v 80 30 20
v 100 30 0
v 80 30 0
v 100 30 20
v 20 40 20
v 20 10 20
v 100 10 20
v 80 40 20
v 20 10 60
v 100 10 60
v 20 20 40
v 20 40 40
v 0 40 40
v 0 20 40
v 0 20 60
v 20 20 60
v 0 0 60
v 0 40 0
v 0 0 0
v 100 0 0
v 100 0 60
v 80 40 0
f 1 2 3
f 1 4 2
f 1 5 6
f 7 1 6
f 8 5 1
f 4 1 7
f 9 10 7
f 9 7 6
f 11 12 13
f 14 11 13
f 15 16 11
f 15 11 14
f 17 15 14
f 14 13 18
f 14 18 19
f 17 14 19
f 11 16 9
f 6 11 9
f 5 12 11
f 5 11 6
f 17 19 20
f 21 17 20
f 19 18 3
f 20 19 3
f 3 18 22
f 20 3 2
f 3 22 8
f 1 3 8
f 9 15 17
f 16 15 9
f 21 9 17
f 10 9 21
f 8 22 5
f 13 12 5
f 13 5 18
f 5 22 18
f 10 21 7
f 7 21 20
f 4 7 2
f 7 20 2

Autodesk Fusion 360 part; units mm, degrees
sketch "Sketch1" plane through (0, 0, 0) normal (0, 0, 1) x (1, 0, 0)
  line L0 (4, 0) -> (0, 0)
  line L1 (0, 0) -> (0, 2.25)
  line L2 (0, 2.25) -> (1.5, 2.25)
  line L3 (1.5, 2.25) -> (1.5, 1.5)
  line L4 (1.5, 1.5) -> (2.75, 1.5)
  line L5 (2.75, 1.5) -> (2.75, 0.75)
  line L6 (2.75, 0.75) -> (4, 0.75)
  line L7 (4, 0.75) -> (4, 0)
  dimension "d1" = 4
  dimension "d4" = 2.25
  dimension "d5" = 1.25
  dimension "d6" = 1.5
  dimension "d7" = 0.75
  dimension "d8" = 0.75
  dimension "d10" = 1.25
sketch "Sketch2" plane through (0, 2.25, 0) normal (0, 1, 0) x (-1, 0, 0)
  line L0 (-1.5, 0) -> (0, 0)
  line L1 (0, 0) -> (0, 1.25)
  line L2 (0, 1.25) -> (-1.5, 1.25)
  line L3 (-1.5, 1.25) -> (-1.5, 0)
  line L4 (-1.5, 0.2963) -> (-0.6318, 0.2963)
  line L5 (-0.6318, 0.2963) -> (-0.6318, 0.976)
  line L6 (-0.6318, 0.976) -> (-3.3284, 0.976)
  line L7 (-3.3284, 0.976) -> (-3.3284, 0.2963)
  line L8 (-3.3284, 0.2963) -> (-1.5, 0.2963)
sketch "Sketch3" plane through (0, 0, 0) normal (0, 0, 1) x (1, 0, 0)
  line L0 (0, 0) -> (100, 0)
  line L1 (100, 0) -> (100, 40)
  line L2 (100, 40) -> (0, 40)
  line L3 (0, 40) -> (0, 0)
  dimension "d15" = 100
  dimension "d16" = 40
extrude "Extrude3" add sketch "Sketch3" along normal blind 60
sketch "Sketch4" plane through (0, 40, 0) normal (0, 1, 0) x (-1, 0, 0)
  line L0 (-100, 0) -> (0, 0)
  line L1 (0, 0) -> (0, 60)
  line L2 (0, 60) -> (-100, 60)
  line L3 (-100, 60) -> (-100, 0)
  line L4 (-20, 60) -> (-20, 20)
  line L5 (-20, 20) -> (-100, 20)
  dimension "d19" = 40
  dimension "d20" = 80
extrude "Extrude4" cut sketch "Sketch4" against normal blind 30 contours L2 L3 L4 L5
sketch "Sketch5" plane through (0, 40, 0) normal (0, 1, 0) x (-1, 0, 0)
  line L0 (-20, 60) -> (-20, 20)
  line L1 (-20, 20) -> (-100, 20)
  line L2 (-100, 20) -> (-100, 0)
  line L3 (-100, 0) -> (0, 0)
  line L4 (0, 0) -> (0, 60)
  line L5 (0, 60) -> (-20, 60)
  line L6 (-20, 40) -> (0, 40)
extrude "Extrude5" cut sketch "Sketch5" against normal blind 20 contours L0 L4 L5 L6
sketch "Sketch6" plane through (0, 40, 0) normal (0, 1, 0) x (-1, 0, 0)
  line L0 (0, 40) -> (-20, 40)
  line L1 (-20, 40) -> (-20, 20)
  line L2 (-20, 20) -> (-100, 20)
  line L3 (-100, 20) -> (-100, 0)
  line L4 (-100, 0) -> (0, 0)
  line L5 (0, 0) -> (0, 40)
  line L6 (-80, 0) -> (-80, 20)
extrude "Extrude6" cut sketch "Sketch6" against normal blind 10 contours L2 L3 L4 L6
